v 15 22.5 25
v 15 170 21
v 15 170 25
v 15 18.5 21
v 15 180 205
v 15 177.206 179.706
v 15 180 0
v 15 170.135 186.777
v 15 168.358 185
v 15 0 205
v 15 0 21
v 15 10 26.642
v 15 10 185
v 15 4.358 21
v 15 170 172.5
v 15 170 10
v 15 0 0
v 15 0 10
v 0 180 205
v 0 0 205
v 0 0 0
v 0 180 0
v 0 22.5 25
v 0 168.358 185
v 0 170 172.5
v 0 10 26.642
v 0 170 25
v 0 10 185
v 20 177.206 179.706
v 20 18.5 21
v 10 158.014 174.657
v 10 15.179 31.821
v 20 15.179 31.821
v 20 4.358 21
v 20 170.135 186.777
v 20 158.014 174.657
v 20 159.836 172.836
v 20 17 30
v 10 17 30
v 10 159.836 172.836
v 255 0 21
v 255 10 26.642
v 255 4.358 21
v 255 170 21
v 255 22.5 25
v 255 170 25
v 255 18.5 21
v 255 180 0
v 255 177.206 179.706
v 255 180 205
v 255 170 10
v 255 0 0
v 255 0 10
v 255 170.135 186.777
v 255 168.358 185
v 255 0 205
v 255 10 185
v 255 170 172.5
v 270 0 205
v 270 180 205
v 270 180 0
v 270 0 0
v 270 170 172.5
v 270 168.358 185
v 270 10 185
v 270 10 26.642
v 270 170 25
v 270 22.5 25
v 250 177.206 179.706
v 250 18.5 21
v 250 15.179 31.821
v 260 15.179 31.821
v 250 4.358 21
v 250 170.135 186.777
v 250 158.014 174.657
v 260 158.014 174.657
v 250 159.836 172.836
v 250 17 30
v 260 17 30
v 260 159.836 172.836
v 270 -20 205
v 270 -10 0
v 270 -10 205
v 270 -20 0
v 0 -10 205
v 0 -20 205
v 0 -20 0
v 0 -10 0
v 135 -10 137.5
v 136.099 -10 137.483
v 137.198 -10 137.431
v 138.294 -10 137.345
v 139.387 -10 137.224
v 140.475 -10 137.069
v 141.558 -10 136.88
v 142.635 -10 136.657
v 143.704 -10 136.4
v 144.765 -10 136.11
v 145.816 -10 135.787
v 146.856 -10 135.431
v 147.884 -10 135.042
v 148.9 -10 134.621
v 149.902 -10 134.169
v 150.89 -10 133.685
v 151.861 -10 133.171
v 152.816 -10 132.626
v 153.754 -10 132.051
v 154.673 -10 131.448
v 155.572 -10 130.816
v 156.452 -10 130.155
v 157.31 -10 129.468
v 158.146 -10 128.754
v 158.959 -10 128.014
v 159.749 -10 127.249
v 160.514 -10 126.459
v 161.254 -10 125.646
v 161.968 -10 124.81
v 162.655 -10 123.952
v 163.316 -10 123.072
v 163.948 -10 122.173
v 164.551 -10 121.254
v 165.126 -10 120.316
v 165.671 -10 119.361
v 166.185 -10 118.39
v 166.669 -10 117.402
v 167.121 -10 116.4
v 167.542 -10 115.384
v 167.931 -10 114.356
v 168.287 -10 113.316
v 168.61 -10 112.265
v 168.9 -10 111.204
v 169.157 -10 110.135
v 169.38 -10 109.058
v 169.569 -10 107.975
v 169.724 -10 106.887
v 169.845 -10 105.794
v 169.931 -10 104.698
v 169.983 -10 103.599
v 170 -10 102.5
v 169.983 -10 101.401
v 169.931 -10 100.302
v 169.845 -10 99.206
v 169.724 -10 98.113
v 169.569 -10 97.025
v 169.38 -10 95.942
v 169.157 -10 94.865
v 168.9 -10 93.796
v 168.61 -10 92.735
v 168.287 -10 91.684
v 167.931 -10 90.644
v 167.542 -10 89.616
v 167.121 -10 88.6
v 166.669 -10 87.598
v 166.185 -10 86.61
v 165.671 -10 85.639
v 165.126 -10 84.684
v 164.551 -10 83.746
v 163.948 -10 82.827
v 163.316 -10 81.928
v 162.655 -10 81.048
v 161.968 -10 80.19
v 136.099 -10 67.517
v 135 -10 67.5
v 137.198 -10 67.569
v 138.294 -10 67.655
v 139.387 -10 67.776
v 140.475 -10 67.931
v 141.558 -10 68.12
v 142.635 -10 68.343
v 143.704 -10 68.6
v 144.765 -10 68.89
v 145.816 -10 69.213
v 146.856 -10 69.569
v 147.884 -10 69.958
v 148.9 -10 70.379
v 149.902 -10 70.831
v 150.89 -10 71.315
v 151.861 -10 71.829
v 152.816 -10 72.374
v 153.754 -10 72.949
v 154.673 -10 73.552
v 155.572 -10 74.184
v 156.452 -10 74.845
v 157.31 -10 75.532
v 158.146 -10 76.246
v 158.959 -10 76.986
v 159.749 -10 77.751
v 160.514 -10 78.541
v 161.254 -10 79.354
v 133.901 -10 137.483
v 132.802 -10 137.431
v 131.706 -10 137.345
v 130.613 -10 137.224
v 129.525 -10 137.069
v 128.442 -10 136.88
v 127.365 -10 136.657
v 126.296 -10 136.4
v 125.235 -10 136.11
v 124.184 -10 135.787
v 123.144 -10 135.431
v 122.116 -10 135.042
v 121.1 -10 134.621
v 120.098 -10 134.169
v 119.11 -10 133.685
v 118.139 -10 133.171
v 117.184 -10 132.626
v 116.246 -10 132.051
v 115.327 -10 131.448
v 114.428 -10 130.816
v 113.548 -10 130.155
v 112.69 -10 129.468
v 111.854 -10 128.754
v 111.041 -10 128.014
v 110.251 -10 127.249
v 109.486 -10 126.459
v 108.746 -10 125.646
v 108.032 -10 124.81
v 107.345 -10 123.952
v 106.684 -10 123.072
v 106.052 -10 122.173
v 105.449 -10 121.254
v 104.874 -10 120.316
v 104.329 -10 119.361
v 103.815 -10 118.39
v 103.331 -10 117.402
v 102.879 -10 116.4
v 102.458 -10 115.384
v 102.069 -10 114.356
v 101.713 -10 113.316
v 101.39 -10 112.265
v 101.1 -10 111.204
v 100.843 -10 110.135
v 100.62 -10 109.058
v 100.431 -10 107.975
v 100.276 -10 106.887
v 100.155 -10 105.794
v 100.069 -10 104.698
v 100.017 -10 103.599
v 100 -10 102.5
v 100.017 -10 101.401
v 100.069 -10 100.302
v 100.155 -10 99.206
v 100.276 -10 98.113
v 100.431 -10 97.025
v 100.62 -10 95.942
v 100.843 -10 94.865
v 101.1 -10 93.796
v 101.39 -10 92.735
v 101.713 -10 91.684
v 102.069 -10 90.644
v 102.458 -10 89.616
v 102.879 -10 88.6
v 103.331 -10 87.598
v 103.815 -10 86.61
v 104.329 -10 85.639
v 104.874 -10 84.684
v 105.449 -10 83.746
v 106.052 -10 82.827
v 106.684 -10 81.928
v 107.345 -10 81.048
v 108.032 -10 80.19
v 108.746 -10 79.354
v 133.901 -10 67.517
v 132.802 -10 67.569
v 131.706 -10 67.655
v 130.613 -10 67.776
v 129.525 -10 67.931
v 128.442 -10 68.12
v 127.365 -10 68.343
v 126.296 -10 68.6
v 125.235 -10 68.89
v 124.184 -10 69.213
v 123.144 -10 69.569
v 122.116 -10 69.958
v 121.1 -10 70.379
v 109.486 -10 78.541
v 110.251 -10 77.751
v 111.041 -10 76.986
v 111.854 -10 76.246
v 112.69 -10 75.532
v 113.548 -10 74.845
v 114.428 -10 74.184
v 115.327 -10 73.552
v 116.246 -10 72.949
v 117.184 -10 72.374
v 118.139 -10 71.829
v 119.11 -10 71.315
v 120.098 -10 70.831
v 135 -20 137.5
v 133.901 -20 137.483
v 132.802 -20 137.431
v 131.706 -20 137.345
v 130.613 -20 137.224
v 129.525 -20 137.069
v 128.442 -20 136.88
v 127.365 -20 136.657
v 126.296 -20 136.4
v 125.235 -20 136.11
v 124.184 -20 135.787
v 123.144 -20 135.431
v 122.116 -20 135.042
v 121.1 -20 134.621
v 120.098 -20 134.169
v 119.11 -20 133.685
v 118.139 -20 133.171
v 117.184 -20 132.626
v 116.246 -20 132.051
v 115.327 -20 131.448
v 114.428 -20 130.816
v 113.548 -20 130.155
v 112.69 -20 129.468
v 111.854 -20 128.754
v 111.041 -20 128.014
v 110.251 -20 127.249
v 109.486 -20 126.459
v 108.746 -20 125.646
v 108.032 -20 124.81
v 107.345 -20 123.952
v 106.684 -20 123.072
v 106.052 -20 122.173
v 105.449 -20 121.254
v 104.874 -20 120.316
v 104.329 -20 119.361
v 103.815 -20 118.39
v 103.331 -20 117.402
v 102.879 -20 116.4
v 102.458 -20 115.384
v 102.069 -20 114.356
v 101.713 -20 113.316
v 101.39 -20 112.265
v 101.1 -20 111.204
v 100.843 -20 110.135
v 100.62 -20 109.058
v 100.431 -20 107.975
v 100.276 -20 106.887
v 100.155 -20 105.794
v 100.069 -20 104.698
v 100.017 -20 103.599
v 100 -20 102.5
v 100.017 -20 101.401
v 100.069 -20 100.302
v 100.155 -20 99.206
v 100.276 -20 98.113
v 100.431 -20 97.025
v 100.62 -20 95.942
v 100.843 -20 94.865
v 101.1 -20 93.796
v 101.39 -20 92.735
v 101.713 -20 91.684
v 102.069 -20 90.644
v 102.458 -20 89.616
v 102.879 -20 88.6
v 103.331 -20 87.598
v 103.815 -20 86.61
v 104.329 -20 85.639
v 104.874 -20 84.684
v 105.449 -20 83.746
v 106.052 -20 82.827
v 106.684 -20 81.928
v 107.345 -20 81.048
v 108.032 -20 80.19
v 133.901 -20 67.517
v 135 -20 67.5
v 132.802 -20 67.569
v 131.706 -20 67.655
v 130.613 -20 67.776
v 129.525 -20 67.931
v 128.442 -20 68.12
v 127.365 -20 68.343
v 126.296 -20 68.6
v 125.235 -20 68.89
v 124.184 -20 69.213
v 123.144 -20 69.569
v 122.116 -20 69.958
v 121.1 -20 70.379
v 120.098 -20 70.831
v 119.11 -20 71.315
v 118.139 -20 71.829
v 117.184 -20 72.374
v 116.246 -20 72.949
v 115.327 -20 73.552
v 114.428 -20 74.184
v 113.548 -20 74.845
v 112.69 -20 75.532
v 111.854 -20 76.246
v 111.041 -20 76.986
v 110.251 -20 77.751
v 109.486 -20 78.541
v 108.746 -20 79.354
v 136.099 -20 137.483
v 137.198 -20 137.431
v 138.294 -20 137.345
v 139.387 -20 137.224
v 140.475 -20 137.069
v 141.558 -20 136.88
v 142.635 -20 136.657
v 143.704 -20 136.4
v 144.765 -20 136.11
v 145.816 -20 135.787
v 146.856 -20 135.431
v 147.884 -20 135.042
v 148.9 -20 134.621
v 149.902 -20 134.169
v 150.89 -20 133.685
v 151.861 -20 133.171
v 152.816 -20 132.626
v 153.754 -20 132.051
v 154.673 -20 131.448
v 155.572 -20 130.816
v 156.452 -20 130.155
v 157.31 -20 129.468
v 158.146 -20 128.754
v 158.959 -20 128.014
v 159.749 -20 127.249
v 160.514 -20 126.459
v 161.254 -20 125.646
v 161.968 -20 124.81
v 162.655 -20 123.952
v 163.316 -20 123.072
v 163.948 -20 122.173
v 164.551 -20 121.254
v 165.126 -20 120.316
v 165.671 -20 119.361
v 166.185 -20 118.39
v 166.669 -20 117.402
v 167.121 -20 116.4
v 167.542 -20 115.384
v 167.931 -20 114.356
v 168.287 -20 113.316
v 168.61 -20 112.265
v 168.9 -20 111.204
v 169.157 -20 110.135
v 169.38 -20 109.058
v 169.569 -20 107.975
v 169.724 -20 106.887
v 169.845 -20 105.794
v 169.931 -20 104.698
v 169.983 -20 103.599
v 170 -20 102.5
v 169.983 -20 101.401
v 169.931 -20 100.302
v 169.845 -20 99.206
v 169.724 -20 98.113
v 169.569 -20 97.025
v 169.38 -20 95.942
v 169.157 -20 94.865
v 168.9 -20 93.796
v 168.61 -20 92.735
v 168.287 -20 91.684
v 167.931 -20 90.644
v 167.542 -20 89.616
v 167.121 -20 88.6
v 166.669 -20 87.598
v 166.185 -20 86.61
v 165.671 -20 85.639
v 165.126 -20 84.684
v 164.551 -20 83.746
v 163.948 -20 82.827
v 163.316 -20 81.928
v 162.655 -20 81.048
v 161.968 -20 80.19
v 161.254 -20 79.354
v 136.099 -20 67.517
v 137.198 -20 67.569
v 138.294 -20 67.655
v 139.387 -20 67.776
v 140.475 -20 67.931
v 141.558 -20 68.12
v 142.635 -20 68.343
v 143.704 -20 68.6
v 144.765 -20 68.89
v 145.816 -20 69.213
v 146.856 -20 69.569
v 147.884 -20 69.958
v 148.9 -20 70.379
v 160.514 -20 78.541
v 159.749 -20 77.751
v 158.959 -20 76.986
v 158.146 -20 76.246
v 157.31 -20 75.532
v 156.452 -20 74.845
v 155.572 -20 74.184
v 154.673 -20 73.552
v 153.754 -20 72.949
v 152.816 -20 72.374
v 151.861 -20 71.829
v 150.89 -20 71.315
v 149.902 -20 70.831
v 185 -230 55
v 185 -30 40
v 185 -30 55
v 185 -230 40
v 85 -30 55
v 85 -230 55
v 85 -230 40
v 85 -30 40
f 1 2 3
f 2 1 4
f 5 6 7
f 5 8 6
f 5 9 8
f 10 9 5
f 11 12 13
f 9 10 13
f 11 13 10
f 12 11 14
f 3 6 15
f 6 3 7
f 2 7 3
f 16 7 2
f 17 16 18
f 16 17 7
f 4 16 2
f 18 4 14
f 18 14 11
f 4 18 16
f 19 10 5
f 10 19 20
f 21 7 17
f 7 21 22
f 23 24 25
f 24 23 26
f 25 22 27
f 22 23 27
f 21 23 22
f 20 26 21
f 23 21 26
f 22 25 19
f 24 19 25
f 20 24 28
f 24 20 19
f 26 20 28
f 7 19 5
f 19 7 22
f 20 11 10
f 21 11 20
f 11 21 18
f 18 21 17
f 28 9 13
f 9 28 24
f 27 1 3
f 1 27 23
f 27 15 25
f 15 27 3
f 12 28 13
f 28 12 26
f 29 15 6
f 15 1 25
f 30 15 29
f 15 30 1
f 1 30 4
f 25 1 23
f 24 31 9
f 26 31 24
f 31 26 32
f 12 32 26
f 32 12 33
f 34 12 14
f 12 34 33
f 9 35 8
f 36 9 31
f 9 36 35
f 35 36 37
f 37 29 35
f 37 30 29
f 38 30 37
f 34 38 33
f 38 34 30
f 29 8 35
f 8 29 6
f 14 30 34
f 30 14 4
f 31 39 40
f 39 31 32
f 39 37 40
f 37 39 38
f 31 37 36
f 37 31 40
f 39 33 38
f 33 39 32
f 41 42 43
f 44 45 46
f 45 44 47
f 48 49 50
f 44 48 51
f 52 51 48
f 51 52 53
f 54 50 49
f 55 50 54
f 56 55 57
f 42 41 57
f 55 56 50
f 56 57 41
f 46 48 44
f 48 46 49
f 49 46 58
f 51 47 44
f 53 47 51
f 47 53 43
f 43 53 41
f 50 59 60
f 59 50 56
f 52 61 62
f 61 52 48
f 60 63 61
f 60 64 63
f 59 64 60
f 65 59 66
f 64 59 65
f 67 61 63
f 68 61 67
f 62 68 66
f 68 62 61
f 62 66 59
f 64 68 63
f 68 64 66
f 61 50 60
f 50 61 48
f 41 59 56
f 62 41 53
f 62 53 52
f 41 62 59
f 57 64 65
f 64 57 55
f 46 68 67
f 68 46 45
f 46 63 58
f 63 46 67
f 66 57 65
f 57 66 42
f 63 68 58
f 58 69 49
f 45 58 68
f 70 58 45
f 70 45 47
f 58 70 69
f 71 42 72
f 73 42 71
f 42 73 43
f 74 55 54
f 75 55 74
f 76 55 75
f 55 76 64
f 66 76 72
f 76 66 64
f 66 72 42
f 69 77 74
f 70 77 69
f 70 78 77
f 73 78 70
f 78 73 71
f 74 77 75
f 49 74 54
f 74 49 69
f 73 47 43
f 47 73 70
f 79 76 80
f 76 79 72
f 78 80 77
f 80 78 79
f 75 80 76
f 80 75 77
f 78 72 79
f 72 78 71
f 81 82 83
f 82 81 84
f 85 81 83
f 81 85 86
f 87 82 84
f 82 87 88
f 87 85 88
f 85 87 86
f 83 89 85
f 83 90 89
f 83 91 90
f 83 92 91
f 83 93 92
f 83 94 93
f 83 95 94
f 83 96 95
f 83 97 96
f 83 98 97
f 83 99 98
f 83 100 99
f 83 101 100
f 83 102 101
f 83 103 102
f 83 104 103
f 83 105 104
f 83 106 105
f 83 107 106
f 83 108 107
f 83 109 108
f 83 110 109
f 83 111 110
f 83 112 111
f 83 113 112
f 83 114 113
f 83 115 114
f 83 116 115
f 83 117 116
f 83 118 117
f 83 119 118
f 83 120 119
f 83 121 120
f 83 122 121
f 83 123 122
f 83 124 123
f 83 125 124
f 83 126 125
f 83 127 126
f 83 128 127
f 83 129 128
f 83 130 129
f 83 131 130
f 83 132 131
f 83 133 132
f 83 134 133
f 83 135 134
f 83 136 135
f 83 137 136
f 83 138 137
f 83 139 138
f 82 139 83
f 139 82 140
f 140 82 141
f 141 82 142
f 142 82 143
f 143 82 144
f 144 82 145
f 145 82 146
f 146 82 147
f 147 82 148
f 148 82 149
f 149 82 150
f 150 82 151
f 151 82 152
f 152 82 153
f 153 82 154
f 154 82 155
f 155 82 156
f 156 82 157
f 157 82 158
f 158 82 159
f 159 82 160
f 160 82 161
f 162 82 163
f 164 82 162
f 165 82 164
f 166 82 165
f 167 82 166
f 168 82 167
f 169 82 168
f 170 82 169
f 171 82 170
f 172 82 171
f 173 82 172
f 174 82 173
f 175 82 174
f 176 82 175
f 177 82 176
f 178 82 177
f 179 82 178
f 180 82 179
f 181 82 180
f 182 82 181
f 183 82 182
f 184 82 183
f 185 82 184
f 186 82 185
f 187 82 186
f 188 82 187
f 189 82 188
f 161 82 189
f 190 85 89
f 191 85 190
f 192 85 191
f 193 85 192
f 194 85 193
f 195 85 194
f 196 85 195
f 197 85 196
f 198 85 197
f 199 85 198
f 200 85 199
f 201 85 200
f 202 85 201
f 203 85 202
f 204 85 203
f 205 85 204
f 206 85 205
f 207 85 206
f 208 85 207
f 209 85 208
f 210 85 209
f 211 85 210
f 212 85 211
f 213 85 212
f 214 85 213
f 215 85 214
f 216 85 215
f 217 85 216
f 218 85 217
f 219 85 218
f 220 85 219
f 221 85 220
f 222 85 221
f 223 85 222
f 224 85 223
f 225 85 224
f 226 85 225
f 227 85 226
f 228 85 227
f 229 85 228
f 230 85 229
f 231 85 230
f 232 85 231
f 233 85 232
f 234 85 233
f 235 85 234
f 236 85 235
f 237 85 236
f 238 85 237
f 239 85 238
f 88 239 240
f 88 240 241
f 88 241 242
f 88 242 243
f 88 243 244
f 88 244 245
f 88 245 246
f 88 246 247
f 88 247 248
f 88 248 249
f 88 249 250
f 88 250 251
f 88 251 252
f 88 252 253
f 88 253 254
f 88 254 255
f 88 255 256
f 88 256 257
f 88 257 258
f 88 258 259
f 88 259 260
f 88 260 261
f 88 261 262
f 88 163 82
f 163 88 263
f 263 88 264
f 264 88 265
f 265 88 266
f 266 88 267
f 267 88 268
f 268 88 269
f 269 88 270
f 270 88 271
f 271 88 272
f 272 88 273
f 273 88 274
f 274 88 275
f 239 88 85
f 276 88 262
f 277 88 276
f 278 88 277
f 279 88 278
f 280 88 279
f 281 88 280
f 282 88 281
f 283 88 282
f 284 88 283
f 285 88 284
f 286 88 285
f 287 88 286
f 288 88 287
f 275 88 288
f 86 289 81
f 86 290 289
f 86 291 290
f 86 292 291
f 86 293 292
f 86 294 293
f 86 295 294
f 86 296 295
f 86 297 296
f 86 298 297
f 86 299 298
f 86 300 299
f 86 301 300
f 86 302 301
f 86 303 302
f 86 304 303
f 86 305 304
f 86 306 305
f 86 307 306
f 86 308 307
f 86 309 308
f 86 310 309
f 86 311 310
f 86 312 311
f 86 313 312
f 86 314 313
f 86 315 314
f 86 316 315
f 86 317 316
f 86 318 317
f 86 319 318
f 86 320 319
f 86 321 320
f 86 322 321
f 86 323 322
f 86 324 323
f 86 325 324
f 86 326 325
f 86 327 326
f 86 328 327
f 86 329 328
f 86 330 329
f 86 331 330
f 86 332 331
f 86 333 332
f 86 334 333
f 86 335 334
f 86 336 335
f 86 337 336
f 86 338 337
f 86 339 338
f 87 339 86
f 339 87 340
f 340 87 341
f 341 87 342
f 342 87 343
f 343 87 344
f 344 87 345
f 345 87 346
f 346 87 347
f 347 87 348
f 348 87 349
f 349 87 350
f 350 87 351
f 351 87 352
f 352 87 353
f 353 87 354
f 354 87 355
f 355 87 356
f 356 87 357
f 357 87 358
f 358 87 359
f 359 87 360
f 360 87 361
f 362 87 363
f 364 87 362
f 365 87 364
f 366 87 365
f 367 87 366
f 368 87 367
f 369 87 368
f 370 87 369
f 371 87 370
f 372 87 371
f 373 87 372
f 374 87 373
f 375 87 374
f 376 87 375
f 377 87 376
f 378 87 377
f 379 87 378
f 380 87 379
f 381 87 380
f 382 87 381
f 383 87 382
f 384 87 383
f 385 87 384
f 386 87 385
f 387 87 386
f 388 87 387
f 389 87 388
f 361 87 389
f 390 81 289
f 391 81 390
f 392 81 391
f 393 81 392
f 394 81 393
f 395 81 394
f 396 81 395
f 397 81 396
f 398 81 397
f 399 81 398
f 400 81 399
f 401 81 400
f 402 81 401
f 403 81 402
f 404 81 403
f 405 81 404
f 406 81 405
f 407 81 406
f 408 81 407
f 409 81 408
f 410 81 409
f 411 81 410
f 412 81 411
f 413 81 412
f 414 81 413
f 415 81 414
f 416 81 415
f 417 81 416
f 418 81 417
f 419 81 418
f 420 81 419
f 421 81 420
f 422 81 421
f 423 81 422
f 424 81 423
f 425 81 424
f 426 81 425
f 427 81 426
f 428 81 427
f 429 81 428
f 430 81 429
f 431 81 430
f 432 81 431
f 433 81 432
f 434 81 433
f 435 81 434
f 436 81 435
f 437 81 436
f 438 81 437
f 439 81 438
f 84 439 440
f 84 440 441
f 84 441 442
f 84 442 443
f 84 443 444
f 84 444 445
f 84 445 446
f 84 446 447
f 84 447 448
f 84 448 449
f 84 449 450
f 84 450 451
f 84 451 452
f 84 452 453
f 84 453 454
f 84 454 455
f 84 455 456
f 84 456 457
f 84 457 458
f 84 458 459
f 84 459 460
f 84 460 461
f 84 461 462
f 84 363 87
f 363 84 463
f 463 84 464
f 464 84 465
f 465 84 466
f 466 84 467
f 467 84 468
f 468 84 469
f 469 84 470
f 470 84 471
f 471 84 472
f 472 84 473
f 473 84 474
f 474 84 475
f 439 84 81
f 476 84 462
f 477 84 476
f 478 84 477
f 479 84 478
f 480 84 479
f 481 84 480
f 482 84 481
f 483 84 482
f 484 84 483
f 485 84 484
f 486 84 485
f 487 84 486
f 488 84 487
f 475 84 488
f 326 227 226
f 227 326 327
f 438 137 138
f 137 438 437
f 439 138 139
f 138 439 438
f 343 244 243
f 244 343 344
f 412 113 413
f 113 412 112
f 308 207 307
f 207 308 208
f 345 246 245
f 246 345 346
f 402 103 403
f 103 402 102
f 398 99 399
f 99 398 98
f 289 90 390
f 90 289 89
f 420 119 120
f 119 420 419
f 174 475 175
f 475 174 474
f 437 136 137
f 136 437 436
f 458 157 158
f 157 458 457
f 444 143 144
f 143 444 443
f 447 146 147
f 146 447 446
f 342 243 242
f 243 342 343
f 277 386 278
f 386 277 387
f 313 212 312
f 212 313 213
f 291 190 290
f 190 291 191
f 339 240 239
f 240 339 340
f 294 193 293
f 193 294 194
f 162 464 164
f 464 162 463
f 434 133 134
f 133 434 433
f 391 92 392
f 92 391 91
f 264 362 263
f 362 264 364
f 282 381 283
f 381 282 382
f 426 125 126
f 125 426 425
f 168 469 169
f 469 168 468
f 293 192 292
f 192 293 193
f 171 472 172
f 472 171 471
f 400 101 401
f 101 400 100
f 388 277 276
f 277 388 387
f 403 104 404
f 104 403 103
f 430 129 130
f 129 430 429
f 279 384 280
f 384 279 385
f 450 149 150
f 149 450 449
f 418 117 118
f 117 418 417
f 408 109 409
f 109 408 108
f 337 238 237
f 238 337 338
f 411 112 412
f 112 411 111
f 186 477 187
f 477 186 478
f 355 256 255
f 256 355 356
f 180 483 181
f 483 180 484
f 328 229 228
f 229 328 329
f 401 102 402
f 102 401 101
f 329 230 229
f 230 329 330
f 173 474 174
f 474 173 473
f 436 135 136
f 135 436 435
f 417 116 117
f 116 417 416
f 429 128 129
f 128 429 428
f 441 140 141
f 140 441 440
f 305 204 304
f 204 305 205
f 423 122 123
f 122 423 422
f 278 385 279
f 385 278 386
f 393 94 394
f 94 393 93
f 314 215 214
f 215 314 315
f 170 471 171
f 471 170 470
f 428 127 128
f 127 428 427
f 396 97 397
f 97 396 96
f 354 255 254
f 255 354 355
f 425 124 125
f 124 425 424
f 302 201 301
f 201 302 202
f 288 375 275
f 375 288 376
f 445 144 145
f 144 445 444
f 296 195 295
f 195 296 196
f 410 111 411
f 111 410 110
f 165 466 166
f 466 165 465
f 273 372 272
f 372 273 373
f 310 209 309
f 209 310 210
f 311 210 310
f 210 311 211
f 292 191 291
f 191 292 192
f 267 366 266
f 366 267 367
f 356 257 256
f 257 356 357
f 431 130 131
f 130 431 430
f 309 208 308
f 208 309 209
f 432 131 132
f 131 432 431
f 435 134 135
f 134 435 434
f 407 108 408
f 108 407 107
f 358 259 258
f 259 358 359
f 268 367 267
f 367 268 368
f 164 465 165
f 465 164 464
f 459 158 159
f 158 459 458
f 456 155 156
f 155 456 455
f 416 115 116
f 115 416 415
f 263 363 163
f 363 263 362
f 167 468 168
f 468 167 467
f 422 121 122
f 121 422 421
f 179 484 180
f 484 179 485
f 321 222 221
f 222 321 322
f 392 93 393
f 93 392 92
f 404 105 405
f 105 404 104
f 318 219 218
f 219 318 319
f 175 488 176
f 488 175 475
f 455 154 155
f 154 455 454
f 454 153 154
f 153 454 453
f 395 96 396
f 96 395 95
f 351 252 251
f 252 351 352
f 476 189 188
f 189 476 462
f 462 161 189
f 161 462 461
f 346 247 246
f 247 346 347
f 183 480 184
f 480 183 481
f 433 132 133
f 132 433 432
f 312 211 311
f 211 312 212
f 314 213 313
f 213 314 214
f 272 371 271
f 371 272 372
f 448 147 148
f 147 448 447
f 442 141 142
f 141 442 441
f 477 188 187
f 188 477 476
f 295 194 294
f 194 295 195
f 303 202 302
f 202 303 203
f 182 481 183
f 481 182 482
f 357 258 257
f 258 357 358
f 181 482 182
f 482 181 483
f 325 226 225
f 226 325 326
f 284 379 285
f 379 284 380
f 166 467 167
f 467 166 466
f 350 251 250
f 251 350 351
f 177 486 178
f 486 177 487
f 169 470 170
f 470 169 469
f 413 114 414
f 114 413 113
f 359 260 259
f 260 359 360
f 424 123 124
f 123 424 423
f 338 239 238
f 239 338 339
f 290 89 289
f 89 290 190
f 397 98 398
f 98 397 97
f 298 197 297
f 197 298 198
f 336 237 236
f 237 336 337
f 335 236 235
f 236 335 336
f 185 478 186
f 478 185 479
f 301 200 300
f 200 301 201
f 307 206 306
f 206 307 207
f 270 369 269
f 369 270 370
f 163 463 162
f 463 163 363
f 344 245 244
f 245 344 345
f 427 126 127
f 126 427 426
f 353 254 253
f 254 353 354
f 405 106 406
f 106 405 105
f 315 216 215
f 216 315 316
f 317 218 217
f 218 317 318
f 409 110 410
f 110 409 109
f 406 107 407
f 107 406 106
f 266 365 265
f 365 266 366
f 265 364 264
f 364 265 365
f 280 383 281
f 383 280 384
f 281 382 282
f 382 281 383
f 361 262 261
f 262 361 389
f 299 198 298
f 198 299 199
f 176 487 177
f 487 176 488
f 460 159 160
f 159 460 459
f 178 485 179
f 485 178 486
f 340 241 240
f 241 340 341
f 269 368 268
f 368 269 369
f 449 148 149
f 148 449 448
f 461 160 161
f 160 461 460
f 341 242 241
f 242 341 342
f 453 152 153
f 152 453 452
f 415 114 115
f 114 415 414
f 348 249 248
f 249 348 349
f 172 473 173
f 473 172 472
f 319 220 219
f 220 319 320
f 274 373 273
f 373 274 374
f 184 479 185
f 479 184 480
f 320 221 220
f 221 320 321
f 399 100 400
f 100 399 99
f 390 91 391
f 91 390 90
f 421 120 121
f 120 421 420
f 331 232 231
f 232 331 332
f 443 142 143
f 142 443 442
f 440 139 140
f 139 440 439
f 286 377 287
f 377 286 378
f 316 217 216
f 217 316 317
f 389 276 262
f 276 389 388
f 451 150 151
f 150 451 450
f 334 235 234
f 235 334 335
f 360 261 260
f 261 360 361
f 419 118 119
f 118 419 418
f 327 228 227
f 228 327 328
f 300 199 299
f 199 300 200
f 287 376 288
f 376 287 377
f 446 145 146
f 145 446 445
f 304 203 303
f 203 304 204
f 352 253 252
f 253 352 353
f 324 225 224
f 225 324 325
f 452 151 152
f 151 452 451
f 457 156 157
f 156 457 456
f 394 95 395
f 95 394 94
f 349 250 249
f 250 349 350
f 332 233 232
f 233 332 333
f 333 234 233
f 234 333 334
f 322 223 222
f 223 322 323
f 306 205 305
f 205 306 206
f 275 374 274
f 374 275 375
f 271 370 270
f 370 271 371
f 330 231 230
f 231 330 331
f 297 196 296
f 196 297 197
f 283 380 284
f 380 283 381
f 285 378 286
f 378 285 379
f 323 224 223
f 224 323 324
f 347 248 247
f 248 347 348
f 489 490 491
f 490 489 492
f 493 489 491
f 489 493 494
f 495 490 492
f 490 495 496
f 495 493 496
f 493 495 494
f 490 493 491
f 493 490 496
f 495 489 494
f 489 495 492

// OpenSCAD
module border(){
    difference(){
        union(){
            difference(){
                cube([15, 180, 205]);
                translate([-1,10,25])
                cube([20, 160,160]);        
            }
            translate([0, 7.5,10])
            rotate([45,0,0])
            cube([20, 240, 10]);
        }
        translate([15,0,10]) tablet();
        translate([10,17,30]) rotate([45,0,0]) glass();        
    }
}

module tablet(){
    difference(){
        cube([240, 170, 11]);
    }
}

module camside(){
    difference(){
        cube([270, 10, 205]);
        translate([270/2, 18, 205/2])
        rotate([90,0,0])
        cylinder(r=35, h=20, $fn=200);
    }
}

module glass(){
    cube([252, 202, 3]);
}

module camholder(){
    cube([100, 200, 15]);
}

%translate([15,0,10]) tablet();
border();
translate([270,0,0]) mirror([1,0,0]) border();

translate([0,-20,0]) camside();
//translate([10,17,30]) rotate([45,0,0]) glass();
translate([270/2-50,-230,40]) camholder();
